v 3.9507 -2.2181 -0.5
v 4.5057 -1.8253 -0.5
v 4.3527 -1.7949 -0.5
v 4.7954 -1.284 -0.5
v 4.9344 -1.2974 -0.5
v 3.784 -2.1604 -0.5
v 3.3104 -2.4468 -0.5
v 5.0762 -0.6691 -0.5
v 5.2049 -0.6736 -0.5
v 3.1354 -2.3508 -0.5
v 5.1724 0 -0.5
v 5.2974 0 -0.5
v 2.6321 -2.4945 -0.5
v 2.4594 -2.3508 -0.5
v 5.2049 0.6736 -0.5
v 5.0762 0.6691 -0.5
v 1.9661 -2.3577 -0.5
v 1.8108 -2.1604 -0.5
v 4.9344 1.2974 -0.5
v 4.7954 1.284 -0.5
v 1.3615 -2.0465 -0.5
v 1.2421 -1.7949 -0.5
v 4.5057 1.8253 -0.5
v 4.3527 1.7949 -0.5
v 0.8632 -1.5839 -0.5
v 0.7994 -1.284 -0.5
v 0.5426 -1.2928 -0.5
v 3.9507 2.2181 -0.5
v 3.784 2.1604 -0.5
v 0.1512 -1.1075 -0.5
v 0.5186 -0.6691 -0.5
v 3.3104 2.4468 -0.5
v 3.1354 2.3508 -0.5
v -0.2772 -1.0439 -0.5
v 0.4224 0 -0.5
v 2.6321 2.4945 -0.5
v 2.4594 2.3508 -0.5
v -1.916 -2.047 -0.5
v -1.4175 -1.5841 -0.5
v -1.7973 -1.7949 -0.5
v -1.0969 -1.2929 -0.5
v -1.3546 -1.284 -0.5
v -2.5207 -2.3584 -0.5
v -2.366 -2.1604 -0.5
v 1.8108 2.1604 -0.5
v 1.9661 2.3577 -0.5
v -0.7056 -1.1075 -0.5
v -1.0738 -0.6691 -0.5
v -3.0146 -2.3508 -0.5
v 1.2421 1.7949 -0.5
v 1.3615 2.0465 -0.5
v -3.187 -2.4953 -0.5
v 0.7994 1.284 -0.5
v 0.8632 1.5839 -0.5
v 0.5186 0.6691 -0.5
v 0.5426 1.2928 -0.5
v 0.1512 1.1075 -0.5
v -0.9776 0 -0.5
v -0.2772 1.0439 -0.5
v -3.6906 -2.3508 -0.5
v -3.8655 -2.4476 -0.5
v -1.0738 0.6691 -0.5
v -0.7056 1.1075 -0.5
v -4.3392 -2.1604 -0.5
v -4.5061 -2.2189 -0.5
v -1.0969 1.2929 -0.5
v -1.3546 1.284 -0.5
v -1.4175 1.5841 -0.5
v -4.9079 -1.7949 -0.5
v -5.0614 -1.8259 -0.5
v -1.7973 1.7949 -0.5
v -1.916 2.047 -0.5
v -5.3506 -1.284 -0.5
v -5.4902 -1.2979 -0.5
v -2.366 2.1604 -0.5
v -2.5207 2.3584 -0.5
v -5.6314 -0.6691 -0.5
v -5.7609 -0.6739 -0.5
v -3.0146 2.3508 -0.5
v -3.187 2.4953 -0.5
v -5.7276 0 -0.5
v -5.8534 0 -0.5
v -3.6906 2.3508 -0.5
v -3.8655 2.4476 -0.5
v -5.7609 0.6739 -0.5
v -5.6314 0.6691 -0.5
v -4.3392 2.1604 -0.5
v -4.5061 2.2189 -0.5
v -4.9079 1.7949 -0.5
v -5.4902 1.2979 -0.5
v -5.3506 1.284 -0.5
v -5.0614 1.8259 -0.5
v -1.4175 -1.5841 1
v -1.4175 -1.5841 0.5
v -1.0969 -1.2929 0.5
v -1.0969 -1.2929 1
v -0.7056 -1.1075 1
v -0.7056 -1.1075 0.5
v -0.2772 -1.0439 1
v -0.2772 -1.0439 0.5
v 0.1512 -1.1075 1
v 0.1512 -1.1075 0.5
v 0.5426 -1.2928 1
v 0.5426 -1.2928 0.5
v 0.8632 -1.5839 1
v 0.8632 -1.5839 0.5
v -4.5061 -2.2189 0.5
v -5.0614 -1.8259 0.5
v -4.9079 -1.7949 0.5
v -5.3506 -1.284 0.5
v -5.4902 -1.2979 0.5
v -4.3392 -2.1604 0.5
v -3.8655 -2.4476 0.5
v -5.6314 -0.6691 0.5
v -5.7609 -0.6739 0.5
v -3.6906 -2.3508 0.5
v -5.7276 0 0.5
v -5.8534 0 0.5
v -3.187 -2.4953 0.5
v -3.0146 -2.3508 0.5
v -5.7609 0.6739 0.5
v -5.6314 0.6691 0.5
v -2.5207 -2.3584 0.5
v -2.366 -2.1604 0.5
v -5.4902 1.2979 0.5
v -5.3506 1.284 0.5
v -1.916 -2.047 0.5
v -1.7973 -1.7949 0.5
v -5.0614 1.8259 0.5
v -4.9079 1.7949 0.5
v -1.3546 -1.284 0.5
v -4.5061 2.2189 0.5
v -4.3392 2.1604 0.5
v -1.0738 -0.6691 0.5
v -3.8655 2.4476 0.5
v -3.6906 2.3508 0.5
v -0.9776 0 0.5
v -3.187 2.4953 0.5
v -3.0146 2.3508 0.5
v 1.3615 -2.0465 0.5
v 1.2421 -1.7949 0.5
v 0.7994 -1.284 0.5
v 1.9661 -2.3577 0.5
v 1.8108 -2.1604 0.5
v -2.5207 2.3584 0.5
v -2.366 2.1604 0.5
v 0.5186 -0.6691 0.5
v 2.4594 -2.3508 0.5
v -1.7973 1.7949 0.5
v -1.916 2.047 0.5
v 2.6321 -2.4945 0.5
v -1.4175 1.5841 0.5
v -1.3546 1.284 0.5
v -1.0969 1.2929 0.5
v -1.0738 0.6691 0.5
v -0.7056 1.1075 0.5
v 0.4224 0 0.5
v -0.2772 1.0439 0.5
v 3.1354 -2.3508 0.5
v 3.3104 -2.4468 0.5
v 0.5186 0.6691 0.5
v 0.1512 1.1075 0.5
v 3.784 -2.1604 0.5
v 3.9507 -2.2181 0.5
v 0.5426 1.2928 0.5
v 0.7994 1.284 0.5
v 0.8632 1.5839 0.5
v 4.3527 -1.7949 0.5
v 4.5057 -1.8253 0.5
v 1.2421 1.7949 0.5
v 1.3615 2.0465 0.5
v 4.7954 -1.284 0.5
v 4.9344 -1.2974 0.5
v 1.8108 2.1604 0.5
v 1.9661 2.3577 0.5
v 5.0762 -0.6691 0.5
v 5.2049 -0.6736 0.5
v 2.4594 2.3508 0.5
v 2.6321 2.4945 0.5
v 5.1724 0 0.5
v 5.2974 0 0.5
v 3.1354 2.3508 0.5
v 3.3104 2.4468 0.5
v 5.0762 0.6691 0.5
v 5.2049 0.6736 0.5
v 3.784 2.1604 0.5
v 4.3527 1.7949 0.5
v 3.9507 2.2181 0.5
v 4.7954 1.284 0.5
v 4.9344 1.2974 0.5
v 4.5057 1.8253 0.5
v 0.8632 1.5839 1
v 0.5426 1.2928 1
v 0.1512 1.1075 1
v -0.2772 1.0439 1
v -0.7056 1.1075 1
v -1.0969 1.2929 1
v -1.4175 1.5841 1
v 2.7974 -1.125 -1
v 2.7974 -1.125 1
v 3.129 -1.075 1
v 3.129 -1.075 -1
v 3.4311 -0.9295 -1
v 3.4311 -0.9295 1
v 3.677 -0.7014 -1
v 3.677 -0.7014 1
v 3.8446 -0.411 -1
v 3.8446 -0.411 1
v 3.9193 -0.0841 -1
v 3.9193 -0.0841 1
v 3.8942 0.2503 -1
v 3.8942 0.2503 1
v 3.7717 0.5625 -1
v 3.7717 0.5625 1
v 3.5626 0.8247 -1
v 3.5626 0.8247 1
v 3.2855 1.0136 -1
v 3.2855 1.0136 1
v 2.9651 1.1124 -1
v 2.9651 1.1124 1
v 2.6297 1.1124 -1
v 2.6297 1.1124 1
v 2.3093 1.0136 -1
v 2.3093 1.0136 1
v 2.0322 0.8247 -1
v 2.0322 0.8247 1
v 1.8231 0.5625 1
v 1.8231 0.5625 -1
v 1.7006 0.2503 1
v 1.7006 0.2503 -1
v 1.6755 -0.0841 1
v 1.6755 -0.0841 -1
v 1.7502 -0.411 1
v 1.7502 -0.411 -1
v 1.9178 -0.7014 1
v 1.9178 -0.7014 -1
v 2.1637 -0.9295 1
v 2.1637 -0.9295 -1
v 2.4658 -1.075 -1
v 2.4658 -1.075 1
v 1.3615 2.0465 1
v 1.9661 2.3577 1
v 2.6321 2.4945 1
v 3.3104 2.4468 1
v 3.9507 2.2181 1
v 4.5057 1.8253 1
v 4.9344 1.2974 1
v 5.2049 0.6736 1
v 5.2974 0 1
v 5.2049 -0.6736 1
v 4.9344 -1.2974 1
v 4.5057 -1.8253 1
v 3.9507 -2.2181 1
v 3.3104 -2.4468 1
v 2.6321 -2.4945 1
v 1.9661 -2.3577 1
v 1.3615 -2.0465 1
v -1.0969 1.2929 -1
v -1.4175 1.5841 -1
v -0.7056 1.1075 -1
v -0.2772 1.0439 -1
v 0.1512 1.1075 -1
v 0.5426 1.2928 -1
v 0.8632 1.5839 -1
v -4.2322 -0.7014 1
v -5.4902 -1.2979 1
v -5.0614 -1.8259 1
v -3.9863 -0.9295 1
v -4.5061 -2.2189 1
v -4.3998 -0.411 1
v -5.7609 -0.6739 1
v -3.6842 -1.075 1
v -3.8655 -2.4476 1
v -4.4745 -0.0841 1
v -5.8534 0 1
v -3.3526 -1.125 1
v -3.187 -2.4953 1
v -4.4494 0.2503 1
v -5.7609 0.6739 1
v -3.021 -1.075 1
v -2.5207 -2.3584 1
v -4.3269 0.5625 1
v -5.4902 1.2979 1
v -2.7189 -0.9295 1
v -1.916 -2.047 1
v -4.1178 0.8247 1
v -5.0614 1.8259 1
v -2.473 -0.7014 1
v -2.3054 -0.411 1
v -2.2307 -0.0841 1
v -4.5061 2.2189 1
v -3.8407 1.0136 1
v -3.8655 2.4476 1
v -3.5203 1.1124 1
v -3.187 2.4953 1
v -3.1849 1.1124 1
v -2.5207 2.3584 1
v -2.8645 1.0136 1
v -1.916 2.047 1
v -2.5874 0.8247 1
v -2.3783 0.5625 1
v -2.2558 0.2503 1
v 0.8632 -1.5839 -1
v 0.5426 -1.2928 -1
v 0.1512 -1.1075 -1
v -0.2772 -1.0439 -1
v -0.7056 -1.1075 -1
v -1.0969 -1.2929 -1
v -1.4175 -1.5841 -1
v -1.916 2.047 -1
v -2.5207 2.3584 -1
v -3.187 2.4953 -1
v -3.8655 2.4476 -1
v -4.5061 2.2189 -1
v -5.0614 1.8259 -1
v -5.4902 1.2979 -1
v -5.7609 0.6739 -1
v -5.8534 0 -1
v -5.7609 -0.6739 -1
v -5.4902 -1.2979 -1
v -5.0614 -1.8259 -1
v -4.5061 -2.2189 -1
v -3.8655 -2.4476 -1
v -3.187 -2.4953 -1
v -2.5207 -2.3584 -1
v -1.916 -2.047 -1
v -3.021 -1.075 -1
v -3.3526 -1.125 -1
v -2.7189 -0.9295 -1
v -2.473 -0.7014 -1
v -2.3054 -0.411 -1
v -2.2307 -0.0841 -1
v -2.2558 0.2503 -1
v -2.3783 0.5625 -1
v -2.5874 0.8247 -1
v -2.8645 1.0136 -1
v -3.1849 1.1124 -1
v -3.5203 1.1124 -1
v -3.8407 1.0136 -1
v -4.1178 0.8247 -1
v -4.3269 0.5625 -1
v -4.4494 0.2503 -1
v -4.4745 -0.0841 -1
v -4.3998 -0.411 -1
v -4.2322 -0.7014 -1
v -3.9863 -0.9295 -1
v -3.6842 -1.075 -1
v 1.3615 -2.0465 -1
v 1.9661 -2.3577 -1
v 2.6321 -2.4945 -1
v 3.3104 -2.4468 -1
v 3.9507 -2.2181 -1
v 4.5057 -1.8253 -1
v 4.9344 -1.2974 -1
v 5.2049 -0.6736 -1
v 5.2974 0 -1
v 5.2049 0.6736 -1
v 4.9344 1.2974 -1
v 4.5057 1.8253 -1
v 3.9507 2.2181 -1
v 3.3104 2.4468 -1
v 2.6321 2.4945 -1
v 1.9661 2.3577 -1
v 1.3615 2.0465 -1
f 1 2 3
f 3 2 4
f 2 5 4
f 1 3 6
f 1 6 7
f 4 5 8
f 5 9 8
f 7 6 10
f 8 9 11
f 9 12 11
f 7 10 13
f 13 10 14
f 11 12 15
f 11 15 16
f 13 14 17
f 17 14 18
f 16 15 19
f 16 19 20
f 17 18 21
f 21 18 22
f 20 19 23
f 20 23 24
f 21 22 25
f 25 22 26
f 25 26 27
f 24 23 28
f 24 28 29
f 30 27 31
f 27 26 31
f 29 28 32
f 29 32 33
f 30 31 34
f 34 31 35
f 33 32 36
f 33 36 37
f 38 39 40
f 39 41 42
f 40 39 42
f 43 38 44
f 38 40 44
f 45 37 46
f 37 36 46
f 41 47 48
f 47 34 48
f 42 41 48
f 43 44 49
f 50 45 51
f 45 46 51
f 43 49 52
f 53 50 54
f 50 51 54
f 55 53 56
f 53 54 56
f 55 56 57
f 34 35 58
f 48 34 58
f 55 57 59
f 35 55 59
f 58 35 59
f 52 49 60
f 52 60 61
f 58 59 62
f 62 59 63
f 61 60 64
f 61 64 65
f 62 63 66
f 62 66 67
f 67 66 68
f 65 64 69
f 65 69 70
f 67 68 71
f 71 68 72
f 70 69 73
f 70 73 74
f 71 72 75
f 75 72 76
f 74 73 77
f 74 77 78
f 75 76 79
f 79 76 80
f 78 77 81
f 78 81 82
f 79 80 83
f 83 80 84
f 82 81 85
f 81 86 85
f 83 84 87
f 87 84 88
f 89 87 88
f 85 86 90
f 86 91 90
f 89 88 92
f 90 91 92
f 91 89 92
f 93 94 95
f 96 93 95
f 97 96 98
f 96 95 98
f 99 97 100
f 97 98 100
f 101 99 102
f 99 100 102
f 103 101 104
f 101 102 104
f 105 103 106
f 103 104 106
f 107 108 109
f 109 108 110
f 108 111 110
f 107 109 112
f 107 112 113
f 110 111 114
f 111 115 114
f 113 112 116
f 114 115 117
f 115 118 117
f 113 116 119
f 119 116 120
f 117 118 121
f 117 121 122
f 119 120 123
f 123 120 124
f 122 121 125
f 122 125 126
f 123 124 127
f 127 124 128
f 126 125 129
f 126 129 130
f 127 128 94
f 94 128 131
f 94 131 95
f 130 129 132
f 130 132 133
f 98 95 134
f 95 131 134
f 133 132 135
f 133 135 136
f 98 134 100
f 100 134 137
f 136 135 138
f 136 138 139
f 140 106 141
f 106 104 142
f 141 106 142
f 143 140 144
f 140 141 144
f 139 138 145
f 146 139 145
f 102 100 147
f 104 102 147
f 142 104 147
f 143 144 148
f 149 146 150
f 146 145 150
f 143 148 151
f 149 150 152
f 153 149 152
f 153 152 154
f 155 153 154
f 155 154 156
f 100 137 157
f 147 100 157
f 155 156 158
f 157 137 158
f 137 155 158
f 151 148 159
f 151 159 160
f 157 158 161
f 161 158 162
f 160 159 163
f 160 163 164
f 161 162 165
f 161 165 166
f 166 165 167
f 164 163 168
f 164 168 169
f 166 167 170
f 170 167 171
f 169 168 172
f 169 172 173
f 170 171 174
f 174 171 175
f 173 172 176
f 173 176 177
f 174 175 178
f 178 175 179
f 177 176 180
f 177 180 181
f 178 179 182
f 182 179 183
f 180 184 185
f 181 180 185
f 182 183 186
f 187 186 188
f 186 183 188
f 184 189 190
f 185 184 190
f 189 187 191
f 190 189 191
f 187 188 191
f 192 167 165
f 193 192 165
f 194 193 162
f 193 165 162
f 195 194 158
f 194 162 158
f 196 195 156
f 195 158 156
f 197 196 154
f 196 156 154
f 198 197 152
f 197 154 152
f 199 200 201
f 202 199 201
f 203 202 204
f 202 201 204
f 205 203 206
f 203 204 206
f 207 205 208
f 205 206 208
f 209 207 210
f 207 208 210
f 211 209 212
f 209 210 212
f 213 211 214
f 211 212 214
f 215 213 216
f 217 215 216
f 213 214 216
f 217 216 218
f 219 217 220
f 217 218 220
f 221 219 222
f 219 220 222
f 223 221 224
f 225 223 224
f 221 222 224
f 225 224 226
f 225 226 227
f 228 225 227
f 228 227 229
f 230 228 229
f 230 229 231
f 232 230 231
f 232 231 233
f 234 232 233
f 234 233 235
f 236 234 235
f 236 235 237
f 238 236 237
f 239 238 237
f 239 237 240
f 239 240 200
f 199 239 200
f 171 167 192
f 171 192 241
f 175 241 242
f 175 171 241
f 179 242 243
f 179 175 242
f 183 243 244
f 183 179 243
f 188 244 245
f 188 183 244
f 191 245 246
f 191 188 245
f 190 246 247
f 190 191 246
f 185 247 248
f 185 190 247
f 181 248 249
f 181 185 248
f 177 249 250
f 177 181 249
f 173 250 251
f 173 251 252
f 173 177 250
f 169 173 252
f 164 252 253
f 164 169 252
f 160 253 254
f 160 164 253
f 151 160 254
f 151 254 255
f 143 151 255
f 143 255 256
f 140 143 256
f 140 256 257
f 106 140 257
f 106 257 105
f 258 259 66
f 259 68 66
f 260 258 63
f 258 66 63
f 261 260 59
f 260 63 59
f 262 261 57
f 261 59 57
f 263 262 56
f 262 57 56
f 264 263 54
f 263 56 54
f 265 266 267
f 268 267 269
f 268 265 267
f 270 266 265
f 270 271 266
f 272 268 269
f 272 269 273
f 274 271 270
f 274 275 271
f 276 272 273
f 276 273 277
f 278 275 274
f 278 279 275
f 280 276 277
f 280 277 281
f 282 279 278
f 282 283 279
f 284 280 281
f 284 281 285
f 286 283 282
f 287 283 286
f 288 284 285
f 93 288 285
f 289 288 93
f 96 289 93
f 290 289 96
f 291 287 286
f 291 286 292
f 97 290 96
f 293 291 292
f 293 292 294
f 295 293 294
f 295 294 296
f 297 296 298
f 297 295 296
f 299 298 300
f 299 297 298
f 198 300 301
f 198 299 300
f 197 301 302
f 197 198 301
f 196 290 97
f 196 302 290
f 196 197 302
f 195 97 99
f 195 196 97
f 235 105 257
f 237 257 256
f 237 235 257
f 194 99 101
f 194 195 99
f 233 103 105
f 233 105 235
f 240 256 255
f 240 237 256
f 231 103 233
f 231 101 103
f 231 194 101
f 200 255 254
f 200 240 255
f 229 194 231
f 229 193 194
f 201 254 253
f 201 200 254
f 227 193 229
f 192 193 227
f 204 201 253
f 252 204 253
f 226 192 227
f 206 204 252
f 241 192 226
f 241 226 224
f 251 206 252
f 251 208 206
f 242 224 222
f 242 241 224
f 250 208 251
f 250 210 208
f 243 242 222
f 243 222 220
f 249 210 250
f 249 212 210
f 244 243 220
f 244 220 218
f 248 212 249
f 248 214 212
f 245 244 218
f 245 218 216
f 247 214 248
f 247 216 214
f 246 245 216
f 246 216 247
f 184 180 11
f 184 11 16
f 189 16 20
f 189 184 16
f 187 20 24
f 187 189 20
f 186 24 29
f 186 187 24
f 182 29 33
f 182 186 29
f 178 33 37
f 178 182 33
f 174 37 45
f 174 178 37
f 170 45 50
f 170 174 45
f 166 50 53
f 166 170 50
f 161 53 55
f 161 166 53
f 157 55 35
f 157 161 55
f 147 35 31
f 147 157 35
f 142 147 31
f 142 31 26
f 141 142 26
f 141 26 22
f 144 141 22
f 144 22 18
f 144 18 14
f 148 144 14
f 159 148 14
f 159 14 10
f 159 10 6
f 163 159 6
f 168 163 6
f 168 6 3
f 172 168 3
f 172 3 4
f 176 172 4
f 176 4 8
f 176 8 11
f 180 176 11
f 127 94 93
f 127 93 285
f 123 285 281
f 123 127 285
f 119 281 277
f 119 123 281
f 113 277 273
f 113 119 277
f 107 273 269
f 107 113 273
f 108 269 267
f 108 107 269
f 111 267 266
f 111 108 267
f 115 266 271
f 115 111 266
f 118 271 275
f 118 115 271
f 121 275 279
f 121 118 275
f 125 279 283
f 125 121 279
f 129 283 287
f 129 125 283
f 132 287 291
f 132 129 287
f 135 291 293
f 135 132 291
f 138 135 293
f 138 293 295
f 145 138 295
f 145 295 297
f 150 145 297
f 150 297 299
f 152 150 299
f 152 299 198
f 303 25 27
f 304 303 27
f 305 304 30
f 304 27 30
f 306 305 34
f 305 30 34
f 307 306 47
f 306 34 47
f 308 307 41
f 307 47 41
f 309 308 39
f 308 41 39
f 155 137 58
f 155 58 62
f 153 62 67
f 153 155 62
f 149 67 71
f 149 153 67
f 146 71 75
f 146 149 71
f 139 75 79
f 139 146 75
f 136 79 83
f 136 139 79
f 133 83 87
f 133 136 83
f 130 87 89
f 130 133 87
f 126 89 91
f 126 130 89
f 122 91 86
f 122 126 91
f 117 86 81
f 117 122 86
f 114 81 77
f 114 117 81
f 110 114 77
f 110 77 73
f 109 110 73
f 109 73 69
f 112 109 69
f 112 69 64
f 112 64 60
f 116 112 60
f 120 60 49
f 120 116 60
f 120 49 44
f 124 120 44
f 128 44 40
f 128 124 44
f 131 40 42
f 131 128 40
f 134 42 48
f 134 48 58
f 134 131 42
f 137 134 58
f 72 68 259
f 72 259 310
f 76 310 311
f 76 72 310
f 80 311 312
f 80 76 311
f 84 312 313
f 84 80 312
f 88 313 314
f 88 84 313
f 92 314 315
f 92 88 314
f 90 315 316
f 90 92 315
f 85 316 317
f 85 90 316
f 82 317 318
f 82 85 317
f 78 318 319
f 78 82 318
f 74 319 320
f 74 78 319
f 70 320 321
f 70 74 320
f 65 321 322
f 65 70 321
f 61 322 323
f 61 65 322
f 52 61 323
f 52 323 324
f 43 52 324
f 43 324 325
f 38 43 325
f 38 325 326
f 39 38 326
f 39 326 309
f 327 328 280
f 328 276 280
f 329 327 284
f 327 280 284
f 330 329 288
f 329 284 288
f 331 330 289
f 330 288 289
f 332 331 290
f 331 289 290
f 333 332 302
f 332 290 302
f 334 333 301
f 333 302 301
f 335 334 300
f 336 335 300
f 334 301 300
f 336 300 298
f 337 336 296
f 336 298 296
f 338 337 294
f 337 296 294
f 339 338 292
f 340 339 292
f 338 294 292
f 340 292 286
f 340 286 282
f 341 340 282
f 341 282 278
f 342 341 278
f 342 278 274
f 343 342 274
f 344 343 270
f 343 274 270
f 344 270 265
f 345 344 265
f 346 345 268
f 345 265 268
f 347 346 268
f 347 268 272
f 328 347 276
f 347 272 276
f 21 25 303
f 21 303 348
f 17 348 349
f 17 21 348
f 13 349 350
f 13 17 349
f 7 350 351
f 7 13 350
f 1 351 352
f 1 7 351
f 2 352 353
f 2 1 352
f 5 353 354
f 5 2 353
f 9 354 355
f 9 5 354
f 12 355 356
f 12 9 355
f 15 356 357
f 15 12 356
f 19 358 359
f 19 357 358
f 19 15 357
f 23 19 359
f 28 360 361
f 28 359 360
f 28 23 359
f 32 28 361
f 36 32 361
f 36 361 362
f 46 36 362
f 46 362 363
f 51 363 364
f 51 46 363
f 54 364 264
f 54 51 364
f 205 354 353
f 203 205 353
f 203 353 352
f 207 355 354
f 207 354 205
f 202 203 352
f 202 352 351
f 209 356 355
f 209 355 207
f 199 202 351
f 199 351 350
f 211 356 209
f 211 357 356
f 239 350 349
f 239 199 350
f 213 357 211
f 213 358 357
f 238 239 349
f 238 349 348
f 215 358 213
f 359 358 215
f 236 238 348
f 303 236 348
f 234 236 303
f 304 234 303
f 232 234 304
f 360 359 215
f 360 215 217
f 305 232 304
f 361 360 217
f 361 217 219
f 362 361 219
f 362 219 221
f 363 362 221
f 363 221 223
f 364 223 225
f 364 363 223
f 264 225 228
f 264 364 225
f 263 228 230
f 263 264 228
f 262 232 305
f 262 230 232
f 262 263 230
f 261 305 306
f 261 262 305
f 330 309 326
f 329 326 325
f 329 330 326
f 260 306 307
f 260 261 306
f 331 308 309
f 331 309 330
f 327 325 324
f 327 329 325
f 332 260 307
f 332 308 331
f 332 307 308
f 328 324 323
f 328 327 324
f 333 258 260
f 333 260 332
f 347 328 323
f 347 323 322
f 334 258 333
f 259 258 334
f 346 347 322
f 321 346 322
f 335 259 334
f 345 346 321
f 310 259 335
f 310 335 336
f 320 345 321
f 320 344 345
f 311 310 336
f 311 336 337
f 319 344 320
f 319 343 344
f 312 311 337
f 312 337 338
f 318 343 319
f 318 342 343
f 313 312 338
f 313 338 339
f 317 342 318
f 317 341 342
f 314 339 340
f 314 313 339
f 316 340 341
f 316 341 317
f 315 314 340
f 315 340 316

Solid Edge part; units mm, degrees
sketch "Sketch1" plane through (0, 0, 0) normal (0, 0, 1) x (1, 0, 0)
  circle A0 centre (-3.3526, 0) radius 2.375
  circle A1 centre (2.7974, 0) radius 2.375
  dimension "D1" = 6.15
extrude "Protrusion1" add sketch "Sketch1" along normal mid plane 1
sketch "Sketch2" plane through (-3.3526, 0, -0.5) normal (0, 0, -1) x (0, -1, 0)
  arc A0 (-1.5841, -1.9351) -> (-1.5839, -4.2158) centre (-2.5177, -3.0755) cw
  arc A1 (1.5841, -1.9351) -> (1.5839, -4.2158) centre (2.5177, -3.0755) ccw
  arc A2 (1.5841, -1.9351) -> (-1.5841, -1.9351) centre (0, 0) ccw
  arc A3 (-1.5839, -4.2158) -> (1.5839, -4.2158) centre (0, -6.15) ccw
extrude "ExtrudedProtrusion_5" add sketch "Sketch2" along normal blind 0.5
mirror "Mirror1" about plane through (0, 0, 0) normal (0, 0, 1) of "ExtrudedProtrusion_5"
hole "Hole_5" at (-3.3526, 0, 1) direction (0, 0, -1) diameter 2.25 end up to next
hole "Hole1" at (2.7974, 0, 1) direction (0, 0, -1) diameter 2.25 end up to next
